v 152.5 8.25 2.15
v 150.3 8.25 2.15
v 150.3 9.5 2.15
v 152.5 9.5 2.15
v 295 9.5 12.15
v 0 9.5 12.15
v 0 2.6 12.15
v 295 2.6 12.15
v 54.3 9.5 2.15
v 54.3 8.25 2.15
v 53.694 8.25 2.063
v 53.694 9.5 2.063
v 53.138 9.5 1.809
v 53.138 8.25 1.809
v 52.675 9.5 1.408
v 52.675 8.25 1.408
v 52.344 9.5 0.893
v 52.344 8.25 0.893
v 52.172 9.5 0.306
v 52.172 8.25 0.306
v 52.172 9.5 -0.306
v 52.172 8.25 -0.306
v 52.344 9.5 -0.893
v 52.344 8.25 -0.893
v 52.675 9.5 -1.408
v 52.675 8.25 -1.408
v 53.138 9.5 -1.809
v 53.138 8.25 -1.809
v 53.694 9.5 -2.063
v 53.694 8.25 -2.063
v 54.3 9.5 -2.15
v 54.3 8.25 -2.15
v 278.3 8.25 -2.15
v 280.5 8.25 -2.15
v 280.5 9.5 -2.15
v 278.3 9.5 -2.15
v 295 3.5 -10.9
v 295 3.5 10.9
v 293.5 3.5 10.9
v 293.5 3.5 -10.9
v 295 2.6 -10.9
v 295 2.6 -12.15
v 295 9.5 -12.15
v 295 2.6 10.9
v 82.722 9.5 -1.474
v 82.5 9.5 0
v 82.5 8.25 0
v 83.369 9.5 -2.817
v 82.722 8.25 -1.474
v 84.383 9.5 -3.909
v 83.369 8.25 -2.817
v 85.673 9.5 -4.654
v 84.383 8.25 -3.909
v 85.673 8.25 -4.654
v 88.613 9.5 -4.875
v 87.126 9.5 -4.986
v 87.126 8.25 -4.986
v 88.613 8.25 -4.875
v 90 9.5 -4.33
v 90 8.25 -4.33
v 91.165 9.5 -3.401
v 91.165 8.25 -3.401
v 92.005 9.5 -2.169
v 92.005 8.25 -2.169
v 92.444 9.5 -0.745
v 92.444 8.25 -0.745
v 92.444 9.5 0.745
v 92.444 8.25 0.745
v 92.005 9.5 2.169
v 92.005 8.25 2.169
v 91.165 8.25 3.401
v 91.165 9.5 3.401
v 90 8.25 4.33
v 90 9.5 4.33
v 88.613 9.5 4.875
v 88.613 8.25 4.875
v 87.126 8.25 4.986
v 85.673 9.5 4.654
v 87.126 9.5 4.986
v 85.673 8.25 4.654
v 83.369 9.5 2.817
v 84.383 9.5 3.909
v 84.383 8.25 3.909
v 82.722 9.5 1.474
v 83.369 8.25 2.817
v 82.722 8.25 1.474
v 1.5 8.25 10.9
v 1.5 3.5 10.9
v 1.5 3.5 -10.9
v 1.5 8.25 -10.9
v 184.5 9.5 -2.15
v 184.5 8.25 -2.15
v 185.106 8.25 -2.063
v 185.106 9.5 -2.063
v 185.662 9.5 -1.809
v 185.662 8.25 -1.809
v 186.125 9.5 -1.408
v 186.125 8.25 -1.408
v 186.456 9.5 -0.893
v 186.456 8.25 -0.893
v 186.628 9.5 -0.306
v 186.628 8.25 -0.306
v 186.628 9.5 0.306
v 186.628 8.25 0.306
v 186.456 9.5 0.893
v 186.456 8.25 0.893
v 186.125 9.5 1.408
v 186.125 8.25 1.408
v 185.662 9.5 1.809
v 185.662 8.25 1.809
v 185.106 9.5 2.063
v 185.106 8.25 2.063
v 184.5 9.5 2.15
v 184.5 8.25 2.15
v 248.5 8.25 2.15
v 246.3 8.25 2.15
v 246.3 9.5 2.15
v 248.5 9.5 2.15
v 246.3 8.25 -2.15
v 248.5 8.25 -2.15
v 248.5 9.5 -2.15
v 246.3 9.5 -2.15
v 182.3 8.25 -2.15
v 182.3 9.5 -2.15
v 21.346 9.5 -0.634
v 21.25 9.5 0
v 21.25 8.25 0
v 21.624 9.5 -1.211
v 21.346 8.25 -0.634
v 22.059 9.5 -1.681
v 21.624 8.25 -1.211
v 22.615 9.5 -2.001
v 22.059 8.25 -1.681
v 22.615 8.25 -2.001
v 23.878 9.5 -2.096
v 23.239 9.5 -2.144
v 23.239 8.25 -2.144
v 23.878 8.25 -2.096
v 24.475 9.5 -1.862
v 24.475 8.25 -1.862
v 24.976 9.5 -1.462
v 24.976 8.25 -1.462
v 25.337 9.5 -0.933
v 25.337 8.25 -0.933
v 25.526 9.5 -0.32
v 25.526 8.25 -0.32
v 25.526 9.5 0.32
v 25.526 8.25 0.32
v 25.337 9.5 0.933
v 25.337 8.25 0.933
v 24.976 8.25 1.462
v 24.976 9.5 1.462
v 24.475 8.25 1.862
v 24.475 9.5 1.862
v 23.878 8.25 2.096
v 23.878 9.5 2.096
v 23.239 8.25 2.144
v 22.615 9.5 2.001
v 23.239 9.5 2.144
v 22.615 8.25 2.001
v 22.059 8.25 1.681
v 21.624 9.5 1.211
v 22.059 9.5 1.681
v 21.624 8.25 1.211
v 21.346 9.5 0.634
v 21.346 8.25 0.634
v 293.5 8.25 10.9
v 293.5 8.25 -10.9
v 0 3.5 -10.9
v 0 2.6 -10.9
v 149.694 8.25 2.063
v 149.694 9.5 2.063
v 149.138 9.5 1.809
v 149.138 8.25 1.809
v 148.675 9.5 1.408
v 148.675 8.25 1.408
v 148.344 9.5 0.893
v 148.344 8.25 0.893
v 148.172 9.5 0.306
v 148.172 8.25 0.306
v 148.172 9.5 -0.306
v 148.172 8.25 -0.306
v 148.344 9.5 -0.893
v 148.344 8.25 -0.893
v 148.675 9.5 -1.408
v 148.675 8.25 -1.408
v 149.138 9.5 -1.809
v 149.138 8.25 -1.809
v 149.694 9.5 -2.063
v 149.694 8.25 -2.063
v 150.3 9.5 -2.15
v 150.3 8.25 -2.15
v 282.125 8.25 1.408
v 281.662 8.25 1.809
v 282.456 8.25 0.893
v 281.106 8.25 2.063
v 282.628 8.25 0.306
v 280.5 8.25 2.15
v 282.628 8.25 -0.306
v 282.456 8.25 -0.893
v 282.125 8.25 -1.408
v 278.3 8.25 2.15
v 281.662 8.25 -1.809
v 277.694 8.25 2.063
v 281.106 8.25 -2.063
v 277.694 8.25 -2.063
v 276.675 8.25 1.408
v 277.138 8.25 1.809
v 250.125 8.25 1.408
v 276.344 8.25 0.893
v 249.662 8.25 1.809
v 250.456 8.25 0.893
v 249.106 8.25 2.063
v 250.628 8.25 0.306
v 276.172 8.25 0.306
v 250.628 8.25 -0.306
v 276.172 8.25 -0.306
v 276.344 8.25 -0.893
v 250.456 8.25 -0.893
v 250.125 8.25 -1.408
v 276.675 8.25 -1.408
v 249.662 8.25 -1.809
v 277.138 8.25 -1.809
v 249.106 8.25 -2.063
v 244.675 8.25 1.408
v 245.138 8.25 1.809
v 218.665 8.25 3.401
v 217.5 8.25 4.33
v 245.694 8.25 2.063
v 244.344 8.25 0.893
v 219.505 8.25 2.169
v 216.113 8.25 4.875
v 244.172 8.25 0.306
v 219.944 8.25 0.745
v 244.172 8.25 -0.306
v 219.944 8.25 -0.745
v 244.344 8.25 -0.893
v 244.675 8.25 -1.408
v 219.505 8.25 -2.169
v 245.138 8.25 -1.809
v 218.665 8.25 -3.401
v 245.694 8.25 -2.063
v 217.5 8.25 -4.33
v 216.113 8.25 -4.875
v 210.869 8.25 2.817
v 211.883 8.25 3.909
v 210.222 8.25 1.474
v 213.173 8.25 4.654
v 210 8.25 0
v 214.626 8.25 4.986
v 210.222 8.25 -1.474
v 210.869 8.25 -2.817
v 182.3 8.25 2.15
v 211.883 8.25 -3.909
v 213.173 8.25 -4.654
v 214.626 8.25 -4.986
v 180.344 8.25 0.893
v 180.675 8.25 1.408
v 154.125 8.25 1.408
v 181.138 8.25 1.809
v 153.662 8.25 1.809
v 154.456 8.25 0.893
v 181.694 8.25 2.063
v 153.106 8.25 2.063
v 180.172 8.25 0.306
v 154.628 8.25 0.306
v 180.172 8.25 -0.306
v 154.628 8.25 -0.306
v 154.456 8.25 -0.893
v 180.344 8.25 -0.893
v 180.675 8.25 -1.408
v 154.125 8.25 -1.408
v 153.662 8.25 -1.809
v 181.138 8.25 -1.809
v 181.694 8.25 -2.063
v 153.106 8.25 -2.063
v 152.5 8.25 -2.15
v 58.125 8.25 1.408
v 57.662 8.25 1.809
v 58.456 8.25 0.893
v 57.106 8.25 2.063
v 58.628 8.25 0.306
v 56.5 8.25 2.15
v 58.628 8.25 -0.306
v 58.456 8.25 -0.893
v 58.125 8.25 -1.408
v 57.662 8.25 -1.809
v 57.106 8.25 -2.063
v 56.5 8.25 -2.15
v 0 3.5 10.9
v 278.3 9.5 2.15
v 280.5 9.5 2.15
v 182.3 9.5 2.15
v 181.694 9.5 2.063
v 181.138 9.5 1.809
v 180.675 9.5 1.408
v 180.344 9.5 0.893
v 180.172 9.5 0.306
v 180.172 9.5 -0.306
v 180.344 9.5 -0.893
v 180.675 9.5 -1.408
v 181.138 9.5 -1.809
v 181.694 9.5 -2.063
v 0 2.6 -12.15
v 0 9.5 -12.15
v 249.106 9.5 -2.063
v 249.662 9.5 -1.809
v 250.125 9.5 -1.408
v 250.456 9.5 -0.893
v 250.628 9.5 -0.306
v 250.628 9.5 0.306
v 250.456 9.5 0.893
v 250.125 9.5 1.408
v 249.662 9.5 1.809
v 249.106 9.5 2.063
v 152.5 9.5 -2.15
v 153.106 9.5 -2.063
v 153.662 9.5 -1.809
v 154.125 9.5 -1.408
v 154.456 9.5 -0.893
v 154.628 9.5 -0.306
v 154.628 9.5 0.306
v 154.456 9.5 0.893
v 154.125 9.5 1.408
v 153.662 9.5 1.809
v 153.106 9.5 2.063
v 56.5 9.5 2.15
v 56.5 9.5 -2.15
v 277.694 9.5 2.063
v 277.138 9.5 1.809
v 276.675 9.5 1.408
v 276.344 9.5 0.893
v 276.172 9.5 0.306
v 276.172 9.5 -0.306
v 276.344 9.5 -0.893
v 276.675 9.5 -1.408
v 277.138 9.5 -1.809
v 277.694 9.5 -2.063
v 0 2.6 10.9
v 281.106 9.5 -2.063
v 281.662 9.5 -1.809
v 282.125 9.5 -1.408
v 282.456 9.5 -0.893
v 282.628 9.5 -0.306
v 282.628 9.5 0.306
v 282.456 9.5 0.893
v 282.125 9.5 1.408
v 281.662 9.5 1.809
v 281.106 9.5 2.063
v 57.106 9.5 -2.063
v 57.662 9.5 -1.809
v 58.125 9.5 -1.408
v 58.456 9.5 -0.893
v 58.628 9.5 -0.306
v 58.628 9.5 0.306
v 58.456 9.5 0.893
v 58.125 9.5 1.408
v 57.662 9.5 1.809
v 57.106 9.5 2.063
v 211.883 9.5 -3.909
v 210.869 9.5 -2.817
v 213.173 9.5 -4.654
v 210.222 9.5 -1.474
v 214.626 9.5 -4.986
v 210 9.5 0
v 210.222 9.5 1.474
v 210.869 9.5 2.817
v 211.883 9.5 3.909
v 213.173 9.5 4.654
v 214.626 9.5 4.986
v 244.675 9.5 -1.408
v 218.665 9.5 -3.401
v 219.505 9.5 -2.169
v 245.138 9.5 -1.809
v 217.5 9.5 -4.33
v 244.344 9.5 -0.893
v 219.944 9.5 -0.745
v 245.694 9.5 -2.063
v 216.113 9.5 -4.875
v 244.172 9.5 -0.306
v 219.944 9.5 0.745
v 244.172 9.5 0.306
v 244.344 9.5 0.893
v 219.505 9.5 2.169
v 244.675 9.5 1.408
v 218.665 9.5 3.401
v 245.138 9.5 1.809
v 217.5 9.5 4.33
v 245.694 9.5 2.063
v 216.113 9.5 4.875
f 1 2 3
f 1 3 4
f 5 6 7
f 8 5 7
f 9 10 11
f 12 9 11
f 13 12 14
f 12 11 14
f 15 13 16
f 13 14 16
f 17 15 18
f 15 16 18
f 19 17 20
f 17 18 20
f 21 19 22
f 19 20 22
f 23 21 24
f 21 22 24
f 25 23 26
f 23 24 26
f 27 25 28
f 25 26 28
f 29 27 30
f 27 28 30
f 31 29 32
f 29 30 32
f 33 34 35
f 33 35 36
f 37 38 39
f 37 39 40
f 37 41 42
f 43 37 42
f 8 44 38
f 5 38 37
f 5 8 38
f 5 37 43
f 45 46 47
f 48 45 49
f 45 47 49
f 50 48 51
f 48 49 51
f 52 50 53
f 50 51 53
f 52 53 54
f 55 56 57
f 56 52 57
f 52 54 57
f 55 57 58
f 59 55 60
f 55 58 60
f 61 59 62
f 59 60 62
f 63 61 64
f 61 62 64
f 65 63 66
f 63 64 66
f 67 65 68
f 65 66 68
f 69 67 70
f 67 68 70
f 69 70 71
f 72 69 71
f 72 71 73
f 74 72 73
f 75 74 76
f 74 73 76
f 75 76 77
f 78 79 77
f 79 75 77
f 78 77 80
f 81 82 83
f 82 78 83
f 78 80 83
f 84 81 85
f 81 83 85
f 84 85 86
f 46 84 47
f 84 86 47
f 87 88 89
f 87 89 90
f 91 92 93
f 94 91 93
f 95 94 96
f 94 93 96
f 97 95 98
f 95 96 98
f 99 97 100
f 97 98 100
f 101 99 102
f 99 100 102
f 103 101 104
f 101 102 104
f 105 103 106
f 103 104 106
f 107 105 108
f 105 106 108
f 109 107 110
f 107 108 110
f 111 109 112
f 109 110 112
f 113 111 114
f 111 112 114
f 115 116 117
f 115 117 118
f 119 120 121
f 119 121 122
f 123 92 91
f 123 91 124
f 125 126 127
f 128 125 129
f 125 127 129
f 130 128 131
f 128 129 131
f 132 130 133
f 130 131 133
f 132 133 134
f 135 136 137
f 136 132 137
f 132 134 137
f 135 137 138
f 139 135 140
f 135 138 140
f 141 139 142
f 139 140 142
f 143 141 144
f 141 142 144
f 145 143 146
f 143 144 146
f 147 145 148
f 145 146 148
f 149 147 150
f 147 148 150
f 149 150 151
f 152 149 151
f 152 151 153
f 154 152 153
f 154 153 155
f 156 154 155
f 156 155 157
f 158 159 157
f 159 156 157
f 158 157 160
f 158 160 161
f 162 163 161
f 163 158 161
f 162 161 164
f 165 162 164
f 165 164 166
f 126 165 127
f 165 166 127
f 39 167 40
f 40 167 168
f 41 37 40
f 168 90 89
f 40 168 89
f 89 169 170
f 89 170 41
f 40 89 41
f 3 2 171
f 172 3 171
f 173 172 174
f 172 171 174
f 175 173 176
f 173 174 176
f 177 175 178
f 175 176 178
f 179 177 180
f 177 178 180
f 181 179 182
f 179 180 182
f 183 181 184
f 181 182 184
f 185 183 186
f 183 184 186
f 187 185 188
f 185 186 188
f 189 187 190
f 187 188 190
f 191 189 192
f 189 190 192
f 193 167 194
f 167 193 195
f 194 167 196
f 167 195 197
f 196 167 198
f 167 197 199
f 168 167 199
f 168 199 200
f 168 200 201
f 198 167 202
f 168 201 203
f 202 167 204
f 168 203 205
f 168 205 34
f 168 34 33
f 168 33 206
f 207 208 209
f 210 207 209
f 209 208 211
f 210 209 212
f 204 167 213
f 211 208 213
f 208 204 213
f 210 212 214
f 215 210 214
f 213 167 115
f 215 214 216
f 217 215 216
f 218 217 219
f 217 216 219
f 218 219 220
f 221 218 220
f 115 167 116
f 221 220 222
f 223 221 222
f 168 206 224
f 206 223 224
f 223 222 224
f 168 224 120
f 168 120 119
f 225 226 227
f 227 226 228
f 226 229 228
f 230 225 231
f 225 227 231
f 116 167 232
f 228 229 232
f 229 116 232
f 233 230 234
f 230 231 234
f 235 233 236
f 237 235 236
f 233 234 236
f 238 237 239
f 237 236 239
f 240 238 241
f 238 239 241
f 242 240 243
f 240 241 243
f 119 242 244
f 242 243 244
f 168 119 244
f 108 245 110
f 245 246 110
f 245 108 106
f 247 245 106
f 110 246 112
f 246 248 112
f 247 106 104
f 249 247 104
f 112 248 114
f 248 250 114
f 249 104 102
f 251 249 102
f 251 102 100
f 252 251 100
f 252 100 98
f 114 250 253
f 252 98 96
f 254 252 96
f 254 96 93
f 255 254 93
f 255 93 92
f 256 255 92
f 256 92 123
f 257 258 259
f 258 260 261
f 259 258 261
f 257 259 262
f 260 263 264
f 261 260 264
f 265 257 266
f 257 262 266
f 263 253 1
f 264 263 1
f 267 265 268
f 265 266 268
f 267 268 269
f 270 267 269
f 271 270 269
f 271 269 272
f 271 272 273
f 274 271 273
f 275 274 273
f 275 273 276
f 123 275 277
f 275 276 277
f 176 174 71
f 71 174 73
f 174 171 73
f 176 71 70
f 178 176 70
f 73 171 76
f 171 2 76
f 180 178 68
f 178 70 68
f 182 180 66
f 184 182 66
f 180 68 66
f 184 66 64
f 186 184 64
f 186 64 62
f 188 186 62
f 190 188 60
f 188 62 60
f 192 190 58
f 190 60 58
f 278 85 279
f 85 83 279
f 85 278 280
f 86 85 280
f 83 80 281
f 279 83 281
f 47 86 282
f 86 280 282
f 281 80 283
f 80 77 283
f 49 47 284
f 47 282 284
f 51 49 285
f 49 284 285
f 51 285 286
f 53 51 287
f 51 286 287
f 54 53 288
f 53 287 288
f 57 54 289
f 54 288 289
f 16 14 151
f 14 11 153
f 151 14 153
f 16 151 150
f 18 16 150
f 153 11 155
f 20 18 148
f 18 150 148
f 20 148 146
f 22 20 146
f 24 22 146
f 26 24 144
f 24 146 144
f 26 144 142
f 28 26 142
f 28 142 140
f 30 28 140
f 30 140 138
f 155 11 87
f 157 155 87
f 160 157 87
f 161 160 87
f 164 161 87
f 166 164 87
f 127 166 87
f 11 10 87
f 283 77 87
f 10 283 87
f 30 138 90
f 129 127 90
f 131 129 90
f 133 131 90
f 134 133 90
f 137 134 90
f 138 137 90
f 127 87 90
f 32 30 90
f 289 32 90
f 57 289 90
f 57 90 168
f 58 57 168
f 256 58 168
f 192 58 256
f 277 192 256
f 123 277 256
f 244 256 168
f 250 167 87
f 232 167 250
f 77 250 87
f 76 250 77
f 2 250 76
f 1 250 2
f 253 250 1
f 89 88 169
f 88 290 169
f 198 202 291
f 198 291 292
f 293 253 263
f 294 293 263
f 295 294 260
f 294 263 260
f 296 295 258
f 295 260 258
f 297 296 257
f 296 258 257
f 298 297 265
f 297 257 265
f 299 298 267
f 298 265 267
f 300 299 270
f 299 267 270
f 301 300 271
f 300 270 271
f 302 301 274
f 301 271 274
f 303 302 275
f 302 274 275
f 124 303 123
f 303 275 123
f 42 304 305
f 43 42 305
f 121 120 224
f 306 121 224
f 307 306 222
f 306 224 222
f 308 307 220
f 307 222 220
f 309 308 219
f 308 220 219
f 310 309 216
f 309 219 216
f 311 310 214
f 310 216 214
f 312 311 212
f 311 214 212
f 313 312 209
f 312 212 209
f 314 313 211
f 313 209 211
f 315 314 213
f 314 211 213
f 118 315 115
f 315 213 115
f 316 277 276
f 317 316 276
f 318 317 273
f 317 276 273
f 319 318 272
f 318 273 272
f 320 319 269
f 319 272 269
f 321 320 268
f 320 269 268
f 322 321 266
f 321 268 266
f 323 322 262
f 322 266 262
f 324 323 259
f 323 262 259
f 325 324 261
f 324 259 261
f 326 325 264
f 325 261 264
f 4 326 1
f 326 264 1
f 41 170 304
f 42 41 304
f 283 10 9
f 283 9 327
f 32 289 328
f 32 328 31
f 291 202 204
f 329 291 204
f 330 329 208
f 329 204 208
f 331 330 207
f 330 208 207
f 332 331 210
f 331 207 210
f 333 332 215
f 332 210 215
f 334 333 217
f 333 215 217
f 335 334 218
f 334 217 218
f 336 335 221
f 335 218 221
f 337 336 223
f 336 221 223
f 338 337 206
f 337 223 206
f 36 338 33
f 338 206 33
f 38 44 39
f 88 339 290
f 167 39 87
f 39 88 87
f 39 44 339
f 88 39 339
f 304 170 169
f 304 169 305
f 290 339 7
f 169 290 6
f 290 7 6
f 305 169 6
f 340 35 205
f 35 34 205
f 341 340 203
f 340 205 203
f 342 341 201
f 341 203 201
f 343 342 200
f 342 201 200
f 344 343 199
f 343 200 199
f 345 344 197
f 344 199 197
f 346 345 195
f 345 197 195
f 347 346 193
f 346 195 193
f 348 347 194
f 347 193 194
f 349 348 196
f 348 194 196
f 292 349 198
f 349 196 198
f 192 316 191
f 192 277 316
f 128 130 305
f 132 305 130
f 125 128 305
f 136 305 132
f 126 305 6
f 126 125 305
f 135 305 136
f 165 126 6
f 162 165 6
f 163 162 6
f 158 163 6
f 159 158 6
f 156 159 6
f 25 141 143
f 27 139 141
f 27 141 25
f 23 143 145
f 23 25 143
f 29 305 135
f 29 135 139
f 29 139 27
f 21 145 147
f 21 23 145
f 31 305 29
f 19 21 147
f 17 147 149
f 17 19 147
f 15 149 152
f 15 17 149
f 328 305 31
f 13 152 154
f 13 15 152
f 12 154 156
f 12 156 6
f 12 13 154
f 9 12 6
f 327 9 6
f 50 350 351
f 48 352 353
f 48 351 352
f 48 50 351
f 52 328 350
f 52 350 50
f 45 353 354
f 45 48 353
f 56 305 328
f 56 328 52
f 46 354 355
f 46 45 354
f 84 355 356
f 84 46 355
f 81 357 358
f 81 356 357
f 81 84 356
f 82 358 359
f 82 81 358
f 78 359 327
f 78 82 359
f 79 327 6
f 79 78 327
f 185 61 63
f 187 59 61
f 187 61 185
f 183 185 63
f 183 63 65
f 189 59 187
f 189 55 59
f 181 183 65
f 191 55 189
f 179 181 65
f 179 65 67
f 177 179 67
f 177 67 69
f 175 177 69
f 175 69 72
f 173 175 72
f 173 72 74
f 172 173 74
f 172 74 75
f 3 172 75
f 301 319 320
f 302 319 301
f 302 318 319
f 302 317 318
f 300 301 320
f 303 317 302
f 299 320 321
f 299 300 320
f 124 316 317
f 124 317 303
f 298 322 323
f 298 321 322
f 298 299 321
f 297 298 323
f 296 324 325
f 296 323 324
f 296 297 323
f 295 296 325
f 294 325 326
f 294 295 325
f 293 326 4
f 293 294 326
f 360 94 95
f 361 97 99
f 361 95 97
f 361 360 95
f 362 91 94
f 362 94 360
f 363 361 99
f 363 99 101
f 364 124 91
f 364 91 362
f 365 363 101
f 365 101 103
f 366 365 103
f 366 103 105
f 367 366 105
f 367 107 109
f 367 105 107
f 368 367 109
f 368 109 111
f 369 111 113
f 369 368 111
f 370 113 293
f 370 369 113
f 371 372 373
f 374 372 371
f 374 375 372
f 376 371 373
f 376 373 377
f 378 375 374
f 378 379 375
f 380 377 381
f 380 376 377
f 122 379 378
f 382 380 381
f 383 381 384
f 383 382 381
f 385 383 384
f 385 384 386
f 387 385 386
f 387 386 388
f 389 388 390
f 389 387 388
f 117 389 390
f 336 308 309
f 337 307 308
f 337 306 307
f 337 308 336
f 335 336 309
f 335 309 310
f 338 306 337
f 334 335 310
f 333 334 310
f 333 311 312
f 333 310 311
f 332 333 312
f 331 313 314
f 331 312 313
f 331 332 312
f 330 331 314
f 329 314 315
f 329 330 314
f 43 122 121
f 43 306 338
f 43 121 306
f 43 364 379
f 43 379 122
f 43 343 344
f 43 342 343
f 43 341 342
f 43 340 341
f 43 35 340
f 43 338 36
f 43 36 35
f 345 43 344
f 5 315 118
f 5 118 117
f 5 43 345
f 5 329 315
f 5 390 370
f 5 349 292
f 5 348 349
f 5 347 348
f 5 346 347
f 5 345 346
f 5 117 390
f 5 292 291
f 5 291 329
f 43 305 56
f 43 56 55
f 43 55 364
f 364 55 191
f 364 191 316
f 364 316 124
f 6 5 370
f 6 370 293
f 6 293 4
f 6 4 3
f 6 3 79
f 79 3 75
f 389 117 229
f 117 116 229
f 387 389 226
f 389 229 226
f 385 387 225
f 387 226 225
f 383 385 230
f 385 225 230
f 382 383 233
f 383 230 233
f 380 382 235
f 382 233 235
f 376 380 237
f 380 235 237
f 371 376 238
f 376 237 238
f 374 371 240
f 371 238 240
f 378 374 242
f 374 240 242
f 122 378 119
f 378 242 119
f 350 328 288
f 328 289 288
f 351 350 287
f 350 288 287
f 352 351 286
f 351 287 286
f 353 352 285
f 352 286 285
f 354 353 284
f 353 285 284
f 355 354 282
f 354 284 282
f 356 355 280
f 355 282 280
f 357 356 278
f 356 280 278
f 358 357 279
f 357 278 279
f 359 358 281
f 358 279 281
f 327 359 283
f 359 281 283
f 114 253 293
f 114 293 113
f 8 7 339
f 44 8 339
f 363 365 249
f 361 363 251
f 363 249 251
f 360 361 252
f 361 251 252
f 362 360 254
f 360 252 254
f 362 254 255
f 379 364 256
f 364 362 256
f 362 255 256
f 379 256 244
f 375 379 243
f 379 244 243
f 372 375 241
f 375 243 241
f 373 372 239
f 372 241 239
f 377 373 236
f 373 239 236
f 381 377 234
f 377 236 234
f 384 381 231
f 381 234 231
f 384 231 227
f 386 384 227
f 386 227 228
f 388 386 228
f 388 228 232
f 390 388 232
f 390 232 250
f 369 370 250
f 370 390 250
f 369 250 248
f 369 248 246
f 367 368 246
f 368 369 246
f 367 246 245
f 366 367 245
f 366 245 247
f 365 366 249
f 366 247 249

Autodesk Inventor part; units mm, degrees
sketch "Esquisse_1" plane through (0, 0, 0) normal (1, 0, 0) x (0, 1, 0)
  line L0 (2.6, 12.15) -> (2.6, 10.9)
  line L1 (2.6, 10.9) -> (8.25, 10.9)
  line L2 (8.25, 10.9) -> (8.25, -10.9)
  line L3 (8.25, -10.9) -> (2.6, -10.9)
  line L4 (2.6, -10.9) -> (2.6, -12.15)
  line L5 (2.6, -12.15) -> (9.5, -12.15)
  line L6 (9.5, -12.15) -> (9.5, 12.15)
  line L7 (9.5, 12.15) -> (2.6, 12.15)
extrude "Extrusion1" add sketch "Esquisse_1" along normal blind 295
sketch "Esquisse_2" plane through (0, 0, 0) normal (1, 0, 0) x (0, 1, 0)
  line L0 (9.5, 10.9) -> (3.5, 10.9)
  line L1 (3.5, 10.9) -> (3.5, -10.9)
  line L2 (3.5, -10.9) -> (9.5, -10.9)
  line L3 (9.5, -10.9) -> (9.5, 10.9)
extrude "Extrusion2" add sketch "Esquisse_2" along normal blind 1.5
sketch "Esquisse_3" plane through (295, 0, 0) normal (1, 0, 0) x (0, 0, -1)
  line L0 (-10.9, 9.5) -> (-10.9, 3.5)
  line L1 (-10.9, 3.5) -> (10.9, 3.5)
  line L2 (10.9, 3.5) -> (10.9, 9.5)
  line L3 (10.9, 9.5) -> (-10.9, 9.5)
extrude "Extrusion3" add sketch "Esquisse_3" against normal blind 1.5
sketch "Esquisse_4" plane through (0, 0, 0) normal (0, 1, 0) x (-1, 0, 0)
  circle A0 centre (-23.4, 0) radius 2.15
extrude "Extrusion4" cut sketch "Esquisse_4" along normal blind 9.5
sketch "Esquisse_5" plane through (0, 0, 0) normal (0, 1, 0) x (-1, 0, 0)
  arc A0 (-54.3, -2.15) -> (-54.3, 2.15) centre (-54.3, 0) ccw
  line L0 (-54.3, 2.15) -> (-56.5, 2.15)
  arc A1 (-56.5, 2.15) -> (-56.5, -2.15) centre (-56.5, 0) ccw
  line L1 (-56.5, -2.15) -> (-54.3, -2.15)
extrude "Extrusion5" cut sketch "Esquisse_5" along normal blind 9.5
sketch "Esquisse_6" plane through (0, 0, 0) normal (0, 1, 0) x (-1, 0, 0)
  arc A0 (-150.3, -2.15) -> (-150.3, 2.15) centre (-150.3, 0) ccw
  line L0 (-150.3, 2.15) -> (-152.5, 2.15)
  arc A1 (-152.5, 2.15) -> (-152.5, -2.15) centre (-152.5, 0) ccw
  line L1 (-152.5, -2.15) -> (-150.3, -2.15)
extrude "Extrusion6" cut sketch "Esquisse_6" along normal blind 9.5
sketch "Esquisse_7" plane through (0, 0, 0) normal (0, 1, 0) x (-1, 0, 0)
  arc A0 (-182.3, -2.15) -> (-182.3, 2.15) centre (-182.3, 0) ccw
  line L0 (-182.3, 2.15) -> (-184.5, 2.15)
  arc A1 (-184.5, 2.15) -> (-184.5, -2.15) centre (-184.5, 0) ccw
  line L1 (-184.5, -2.15) -> (-182.3, -2.15)
extrude "Extrusion7" cut sketch "Esquisse_7" along normal blind 9.5
sketch "Esquisse_8" plane through (0, 0, 0) normal (0, 1, 0) x (-1, 0, 0)
  arc A0 (-246.3, -2.15) -> (-246.3, 2.15) centre (-246.3, 0) ccw
  line L0 (-246.3, 2.15) -> (-248.5, 2.15)
  arc A1 (-248.5, 2.15) -> (-248.5, -2.15) centre (-248.5, 0) ccw
  line L1 (-248.5, -2.15) -> (-246.3, -2.15)
extrude "Extrusion8" cut sketch "Esquisse_8" along normal blind 9.5
sketch "Esquisse_9" plane through (0, 0, 0) normal (0, 1, 0) x (-1, 0, 0)
  arc A0 (-278.3, -2.15) -> (-278.3, 2.15) centre (-278.3, 0) ccw
  line L0 (-278.3, 2.15) -> (-280.5, 2.15)
  arc A1 (-280.5, 2.15) -> (-280.5, -2.15) centre (-280.5, 0) ccw
  line L1 (-280.5, -2.15) -> (-278.3, -2.15)
extrude "Extrusion9" cut sketch "Esquisse_9" along normal blind 9.5
sketch "Esquisse_10" plane through (0, 0, 0) normal (0, 1, 0) x (-1, 0, 0)
  circle A0 centre (-87.5, 0) radius 5
extrude "Extrusion10" cut sketch "Esquisse_10" along normal blind 9.5
sketch "Esquisse_11" plane through (0, 0, 0) normal (0, 1, 0) x (-1, 0, 0)
  circle A0 centre (-215, 0) radius 5
extrude "Extrusion11" cut sketch "Esquisse_11" along normal blind 9.5
ref_plane "IP0_XY" through (0, 0, 0) normal (1, 0, 0) x (0, 0, -1)
ref_plane "IP0_YZ" through (0, 0, 0) normal (0, 0, -1) x (0, 1, 0)
ref_plane "IP0_ZX" through (0, 0, 0) normal (0, 1, 0) x (1, 0, 0)
properties part number "MICHAUD CHAILLY B3 - 21 - 30 - 2"
